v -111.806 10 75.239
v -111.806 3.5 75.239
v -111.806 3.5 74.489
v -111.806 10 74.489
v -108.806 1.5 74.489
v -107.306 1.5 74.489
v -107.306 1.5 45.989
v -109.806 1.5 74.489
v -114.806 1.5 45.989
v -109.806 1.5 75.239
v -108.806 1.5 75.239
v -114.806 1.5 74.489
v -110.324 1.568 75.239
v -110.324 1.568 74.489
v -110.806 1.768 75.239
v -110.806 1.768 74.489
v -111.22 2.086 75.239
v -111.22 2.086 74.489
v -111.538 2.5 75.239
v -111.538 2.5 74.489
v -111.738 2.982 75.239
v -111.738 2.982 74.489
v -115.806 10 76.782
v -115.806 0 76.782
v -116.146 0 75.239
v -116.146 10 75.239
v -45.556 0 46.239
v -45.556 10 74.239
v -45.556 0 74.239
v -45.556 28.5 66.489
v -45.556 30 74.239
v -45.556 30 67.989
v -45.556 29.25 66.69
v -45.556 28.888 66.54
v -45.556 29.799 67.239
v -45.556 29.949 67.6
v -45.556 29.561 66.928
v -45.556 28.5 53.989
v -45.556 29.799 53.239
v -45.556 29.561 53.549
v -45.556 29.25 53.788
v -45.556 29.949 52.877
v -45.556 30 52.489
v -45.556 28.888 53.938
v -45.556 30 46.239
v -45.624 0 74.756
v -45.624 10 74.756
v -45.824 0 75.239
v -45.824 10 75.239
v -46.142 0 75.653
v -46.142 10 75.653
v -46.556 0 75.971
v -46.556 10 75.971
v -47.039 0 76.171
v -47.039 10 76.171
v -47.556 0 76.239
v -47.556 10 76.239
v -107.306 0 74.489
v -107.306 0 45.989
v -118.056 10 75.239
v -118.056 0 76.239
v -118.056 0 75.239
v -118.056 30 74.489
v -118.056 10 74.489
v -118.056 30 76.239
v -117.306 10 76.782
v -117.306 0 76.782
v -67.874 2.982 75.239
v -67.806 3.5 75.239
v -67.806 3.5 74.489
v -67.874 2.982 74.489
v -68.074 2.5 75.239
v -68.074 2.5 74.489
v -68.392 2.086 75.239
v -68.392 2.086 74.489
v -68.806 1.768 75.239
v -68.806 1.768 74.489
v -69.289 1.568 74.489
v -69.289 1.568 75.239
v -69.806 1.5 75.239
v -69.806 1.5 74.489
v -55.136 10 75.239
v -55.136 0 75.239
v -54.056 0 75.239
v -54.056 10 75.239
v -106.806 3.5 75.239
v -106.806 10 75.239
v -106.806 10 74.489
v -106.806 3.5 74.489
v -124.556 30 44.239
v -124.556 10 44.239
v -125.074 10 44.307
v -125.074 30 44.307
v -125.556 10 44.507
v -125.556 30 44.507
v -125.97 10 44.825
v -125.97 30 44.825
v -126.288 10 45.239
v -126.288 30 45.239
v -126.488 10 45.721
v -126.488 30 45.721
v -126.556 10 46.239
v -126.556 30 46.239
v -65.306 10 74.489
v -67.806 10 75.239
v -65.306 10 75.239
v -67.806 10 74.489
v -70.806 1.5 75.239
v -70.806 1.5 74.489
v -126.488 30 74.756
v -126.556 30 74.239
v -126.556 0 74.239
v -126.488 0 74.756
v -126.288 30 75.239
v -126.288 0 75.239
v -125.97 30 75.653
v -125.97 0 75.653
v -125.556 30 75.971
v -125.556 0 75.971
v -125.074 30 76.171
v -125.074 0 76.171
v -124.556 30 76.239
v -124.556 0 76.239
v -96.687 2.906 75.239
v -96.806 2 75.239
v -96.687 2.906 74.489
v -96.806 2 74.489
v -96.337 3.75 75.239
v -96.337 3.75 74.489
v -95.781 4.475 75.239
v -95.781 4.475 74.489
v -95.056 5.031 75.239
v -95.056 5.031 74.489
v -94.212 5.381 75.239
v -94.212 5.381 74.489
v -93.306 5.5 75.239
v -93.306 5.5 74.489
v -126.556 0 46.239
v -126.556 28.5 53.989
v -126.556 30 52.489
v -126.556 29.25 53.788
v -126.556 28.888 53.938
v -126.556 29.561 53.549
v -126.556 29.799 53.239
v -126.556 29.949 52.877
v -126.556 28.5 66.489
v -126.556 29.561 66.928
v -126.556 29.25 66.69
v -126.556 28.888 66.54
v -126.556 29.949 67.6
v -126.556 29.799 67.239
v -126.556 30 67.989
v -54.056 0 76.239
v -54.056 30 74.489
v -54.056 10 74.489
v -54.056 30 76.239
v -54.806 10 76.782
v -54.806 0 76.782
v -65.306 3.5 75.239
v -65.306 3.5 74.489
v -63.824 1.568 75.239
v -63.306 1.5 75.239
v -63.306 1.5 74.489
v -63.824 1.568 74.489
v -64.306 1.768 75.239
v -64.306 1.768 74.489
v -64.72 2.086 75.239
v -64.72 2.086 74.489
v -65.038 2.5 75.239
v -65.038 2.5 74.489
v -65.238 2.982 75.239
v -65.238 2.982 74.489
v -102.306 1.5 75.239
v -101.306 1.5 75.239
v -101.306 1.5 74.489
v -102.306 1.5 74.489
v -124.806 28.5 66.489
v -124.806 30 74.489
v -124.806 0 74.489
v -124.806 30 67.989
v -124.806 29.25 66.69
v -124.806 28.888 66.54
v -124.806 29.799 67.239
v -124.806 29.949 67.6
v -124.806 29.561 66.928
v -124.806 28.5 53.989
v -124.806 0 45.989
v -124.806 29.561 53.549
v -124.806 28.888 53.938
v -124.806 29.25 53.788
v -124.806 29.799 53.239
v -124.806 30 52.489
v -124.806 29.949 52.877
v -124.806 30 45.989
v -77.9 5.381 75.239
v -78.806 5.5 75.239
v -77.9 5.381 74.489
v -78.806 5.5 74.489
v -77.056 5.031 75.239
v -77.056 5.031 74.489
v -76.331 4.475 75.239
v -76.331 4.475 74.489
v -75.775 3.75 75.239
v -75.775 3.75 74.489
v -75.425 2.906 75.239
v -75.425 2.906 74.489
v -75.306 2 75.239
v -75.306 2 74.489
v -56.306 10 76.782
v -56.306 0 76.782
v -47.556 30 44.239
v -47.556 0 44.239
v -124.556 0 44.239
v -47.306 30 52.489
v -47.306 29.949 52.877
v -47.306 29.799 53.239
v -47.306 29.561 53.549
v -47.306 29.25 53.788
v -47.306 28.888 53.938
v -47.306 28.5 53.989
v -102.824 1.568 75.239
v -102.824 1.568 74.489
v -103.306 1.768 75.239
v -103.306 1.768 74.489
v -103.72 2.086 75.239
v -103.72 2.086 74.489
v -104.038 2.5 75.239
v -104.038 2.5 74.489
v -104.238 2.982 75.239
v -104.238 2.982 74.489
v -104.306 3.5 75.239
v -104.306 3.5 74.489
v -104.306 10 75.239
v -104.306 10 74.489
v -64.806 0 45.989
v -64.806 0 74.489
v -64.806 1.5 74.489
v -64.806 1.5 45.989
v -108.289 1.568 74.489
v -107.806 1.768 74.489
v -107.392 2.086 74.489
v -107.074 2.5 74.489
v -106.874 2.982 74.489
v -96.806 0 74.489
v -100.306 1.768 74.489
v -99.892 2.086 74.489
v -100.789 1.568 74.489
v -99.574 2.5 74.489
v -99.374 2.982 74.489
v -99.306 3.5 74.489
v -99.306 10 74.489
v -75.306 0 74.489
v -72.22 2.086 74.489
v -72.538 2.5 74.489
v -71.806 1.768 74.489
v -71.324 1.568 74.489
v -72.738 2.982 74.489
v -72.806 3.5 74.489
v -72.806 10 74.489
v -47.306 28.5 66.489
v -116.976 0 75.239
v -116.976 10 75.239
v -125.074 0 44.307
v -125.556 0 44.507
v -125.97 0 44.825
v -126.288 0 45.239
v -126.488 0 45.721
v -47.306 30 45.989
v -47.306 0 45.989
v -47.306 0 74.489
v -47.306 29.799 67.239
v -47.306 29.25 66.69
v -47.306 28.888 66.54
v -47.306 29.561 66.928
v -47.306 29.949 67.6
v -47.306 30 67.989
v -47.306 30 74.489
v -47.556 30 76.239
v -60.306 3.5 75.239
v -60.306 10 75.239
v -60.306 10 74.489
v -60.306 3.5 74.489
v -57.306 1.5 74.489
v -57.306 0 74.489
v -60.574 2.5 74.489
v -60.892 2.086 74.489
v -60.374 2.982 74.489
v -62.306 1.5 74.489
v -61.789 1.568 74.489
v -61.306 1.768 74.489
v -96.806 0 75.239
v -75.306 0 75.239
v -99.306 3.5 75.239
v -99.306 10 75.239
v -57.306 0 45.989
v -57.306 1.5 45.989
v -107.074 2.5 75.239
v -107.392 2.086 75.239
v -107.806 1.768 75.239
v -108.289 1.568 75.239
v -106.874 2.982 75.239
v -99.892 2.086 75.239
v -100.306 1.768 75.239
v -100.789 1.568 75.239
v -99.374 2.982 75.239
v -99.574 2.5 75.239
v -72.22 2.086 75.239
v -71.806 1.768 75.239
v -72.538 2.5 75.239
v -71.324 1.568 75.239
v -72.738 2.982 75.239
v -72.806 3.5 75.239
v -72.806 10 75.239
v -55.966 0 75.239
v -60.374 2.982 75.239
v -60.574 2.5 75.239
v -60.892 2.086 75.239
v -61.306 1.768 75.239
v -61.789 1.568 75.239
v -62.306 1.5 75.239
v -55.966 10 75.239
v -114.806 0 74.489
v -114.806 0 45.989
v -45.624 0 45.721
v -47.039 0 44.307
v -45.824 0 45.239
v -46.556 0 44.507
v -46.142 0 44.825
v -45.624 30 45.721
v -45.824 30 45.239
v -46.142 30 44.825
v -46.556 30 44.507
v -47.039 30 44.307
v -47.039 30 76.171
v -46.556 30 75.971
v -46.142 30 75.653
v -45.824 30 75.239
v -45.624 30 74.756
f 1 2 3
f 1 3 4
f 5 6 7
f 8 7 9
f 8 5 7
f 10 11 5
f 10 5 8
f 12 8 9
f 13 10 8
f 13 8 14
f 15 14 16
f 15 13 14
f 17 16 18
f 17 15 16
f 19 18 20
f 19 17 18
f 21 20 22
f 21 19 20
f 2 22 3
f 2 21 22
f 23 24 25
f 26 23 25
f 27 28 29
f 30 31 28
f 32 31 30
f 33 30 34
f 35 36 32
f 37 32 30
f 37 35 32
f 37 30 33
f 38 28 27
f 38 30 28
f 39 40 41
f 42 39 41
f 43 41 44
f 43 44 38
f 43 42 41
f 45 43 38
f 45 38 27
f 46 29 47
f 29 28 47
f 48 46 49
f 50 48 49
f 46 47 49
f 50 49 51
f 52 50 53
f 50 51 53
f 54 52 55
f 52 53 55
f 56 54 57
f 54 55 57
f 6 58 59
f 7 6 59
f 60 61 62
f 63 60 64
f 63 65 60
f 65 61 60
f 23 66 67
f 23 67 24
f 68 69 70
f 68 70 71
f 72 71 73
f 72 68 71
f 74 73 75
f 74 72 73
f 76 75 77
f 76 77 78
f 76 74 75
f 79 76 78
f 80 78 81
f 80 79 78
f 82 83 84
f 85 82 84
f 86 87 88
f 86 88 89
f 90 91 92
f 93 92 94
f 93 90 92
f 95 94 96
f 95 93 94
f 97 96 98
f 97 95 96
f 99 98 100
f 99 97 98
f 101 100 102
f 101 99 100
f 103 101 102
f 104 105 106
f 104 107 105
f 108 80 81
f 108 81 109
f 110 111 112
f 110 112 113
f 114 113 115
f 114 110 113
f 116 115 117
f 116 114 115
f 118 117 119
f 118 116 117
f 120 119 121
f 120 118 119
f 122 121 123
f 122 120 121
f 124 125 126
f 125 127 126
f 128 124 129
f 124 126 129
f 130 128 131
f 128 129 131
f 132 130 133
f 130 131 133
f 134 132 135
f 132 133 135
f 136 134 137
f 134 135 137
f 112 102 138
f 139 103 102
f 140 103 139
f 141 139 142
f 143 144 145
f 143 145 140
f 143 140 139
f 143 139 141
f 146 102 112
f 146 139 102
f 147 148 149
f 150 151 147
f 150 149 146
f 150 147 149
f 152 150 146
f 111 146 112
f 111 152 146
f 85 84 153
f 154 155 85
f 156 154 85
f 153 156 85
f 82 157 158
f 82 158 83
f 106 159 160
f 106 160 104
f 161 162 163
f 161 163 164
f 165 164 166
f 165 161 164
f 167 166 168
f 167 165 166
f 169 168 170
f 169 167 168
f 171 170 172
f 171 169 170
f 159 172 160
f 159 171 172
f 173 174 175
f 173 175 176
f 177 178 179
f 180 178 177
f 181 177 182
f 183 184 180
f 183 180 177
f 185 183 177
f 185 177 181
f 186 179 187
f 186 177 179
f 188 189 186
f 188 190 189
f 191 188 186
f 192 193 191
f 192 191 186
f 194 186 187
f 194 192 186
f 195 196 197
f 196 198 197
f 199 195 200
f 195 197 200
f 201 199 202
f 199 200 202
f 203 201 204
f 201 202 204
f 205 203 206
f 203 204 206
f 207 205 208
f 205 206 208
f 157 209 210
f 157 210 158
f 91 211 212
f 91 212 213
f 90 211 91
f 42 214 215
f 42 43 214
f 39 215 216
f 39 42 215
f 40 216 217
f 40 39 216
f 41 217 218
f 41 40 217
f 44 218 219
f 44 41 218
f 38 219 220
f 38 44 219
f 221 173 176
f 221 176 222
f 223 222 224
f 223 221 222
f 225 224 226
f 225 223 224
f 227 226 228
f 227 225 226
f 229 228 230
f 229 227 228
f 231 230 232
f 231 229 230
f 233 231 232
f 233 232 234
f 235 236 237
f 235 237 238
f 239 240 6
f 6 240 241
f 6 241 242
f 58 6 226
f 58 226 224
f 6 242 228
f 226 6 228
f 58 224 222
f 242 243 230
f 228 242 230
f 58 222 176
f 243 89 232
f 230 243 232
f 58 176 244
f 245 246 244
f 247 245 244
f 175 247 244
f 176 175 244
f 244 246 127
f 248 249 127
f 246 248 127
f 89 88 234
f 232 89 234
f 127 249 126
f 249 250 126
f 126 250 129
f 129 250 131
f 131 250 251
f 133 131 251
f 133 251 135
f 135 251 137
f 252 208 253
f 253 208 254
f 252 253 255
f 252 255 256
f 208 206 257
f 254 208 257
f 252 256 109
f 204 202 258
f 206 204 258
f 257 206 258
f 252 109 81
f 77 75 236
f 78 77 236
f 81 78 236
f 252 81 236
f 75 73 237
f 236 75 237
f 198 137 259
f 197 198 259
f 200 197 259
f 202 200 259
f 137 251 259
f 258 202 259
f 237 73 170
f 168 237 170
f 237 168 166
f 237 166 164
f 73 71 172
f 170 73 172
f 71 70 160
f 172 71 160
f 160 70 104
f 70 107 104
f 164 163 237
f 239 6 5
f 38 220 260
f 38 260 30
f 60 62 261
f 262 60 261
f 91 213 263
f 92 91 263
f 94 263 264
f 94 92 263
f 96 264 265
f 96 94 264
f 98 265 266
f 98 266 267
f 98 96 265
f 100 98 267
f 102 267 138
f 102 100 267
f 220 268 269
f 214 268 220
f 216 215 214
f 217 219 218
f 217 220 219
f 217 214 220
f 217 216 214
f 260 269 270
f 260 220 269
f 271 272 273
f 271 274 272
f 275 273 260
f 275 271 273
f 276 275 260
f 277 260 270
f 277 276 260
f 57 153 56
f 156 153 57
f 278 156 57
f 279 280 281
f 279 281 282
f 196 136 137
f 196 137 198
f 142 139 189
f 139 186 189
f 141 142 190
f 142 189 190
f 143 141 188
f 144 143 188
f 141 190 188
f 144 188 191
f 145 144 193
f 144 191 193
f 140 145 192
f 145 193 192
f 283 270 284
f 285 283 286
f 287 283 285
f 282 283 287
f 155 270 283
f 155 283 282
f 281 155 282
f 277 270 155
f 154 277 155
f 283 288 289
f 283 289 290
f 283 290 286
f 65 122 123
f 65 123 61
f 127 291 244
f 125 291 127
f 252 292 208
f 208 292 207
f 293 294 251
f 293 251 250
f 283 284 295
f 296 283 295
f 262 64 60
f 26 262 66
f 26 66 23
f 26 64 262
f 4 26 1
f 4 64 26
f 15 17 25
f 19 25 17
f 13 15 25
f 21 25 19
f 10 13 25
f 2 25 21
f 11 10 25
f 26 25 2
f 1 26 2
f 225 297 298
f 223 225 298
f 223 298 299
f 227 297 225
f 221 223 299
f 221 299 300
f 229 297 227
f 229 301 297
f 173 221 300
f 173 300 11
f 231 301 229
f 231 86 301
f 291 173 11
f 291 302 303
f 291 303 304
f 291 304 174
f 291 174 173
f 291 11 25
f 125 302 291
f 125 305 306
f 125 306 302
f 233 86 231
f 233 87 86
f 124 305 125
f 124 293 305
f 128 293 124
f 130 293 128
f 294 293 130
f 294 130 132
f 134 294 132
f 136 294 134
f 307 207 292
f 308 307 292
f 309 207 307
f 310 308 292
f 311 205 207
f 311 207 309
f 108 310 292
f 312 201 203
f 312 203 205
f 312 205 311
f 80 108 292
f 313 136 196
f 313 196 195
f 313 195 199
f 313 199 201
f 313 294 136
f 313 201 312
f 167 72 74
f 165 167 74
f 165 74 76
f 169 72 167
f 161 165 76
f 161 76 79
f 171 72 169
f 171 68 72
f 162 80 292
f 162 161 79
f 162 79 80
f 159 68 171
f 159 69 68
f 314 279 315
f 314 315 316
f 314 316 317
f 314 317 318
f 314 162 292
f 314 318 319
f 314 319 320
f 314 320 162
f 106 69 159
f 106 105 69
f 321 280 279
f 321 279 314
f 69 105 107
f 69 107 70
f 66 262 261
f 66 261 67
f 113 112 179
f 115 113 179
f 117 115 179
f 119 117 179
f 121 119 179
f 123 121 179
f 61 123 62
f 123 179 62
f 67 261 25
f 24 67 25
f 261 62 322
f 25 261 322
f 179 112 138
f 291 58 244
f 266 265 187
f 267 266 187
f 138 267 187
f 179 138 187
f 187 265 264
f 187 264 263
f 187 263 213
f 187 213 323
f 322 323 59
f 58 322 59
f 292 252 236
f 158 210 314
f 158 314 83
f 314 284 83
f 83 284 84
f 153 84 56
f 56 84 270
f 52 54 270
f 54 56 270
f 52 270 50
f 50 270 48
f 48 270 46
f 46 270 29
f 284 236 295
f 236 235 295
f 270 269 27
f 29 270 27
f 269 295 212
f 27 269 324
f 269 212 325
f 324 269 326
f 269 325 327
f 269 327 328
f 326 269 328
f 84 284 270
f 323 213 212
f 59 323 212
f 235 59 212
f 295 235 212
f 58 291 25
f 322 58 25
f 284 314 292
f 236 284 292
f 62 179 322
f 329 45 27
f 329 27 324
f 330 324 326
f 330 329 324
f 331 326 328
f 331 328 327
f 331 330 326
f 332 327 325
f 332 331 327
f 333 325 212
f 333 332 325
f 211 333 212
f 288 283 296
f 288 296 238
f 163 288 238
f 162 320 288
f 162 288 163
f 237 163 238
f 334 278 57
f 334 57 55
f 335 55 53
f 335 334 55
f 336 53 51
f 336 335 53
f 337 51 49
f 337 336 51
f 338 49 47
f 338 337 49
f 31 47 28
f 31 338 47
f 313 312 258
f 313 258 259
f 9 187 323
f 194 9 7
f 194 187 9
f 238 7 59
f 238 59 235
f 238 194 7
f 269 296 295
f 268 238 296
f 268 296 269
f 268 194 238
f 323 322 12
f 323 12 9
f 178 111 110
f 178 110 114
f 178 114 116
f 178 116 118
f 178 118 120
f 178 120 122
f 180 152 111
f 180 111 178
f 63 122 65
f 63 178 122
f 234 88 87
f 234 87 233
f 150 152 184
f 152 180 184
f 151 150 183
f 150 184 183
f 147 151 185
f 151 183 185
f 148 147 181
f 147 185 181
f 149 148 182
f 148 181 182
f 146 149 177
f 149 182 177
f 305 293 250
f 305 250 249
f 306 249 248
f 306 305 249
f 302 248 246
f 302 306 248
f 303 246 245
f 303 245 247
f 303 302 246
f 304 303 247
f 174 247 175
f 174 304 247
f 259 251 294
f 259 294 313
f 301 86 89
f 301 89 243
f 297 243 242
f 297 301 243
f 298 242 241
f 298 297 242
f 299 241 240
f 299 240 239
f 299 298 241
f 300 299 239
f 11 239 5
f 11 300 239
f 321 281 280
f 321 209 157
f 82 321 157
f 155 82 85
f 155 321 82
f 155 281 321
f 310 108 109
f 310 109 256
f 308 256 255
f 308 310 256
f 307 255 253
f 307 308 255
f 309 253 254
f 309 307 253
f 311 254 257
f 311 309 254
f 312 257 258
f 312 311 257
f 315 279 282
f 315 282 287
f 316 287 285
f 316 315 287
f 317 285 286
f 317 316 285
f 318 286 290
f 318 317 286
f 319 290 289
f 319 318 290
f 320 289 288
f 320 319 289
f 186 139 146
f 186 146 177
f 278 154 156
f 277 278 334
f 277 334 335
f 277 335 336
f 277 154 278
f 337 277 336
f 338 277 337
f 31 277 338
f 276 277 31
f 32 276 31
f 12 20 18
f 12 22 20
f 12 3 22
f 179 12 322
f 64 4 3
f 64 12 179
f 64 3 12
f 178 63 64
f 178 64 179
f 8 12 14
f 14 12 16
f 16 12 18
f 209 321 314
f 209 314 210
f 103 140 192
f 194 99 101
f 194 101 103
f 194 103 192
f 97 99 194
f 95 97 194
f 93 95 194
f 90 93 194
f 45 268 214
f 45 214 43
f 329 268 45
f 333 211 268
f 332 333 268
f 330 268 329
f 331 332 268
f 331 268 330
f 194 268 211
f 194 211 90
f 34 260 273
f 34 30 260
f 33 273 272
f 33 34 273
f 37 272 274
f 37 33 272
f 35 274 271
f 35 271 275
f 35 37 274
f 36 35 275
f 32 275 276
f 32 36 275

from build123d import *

# Parameters (mm, degrees)
SKETCH1_W           = 81
SKETCH1_H           = 32
BOSS_EXTRUDE1_DEPTH = 10
SKETCH2_W           = 77.5
SKETCH2_H           = 28.5
CUT_EXTRUDE1_DEPTH  = 10
SKETCH3_W           = 7.5
SKETCH3_H           = 32
BOSS_EXTRUDE2_DEPTH = 1.5
SKETCH4_W           = 64
SKETCH4_H           = 1
CUT_EXTRUDE2_DEPTH  = 10
BOSS_EXTRUDE3_DEPTH = 10
BOSS_EXTRUDE4_DEPTH = 10
FILLET1_R           = 2
FILLET2_R           = 2
FILLET3_R           = 2
FILLET4_R           = 2
CUT_EXTRUDE3_DEPTH  = 0.75
SKETCH8_W           = 21.5
SKETCH8_H           = 5.5
CUT_EXTRUDE4_DEPTH  = 0.75
FILLET5_R           = 3.5
FILLET6_R           = 3.5
BOSS_EXTRUDE5_START = 20
BOSS_EXTRUDE5_DEPTH = 20
SKETCH10_W          = 1.75
SKETCH10_H          = 12.5
CUT_EXTRUDE5_DEPTH  = 1.5
FILLET7_R           = 1.5
FILLET8_R           = 1.5
FILLET10_R          = 1.5
FILLET11_R          = 1.5


with BuildPart() as part:
    # Sketch1 → Boss-Extrude1 (new body)
    with BuildSketch(Plane(origin=(0, 0, 0), x_dir=(1, 0, 0), z_dir=(0, 1, 0))):
        with Locations((-86.056207425, -60.23876691)):
            Rectangle(SKETCH1_W, SKETCH1_H)
    extrude(amount=BOSS_EXTRUDE1_DEPTH)

    # Sketch2 → Cut-Extrude1 (cut)
    with BuildSketch(Plane(origin=(0, 10, 0), x_dir=(1, 0, 0), z_dir=(0, 1, 0))):
        with Locations((-86.056207425, -60.23876691)):
            Rectangle(SKETCH2_W, SKETCH2_H)
    extrude(amount=-CUT_EXTRUDE1_DEPTH, mode=Mode.SUBTRACT)

    # Sketch3 → Boss-Extrude2 (add)
    with BuildSketch(Plane(origin=(0, 0, 0), x_dir=(-1, 0, 0), z_dir=(0, -1, 0))):
        with Locations((61.056207425, -60.23876691)):
            Rectangle(SKETCH3_W, SKETCH3_H)
        with Locations((111.056207425, -60.23876691)):
            Rectangle(SKETCH3_W, SKETCH3_H)
    extrude(amount=-BOSS_EXTRUDE2_DEPTH)

    # Sketch4 → Cut-Extrude2 (cut)
    with BuildSketch(Plane(origin=(0, 10, 0), x_dir=(1, 0, 0), z_dir=(0, 1, 0))):
        with Locations((-86.056207425, -75.73876691)):
            Rectangle(SKETCH4_W, SKETCH4_H)
    extrude(amount=-CUT_EXTRUDE2_DEPTH, mode=Mode.SUBTRACT)

    # Sketch5 → Boss-Extrude3 (add)
    with BuildSketch(Plane(origin=(0, 10, 0), x_dir=(1, 0, 0), z_dir=(0, 1, 0))):
        Polygon((-116.976207425, -75.23876691), (-117.306207425, -76.781751031), (-115.806207425, -76.781751031), (-116.146207425, -75.23876691), align=None)
    extrude(amount=-BOSS_EXTRUDE3_DEPTH)

    # Sketch6 → Boss-Extrude4 (add)
    with BuildSketch(Plane(origin=(0, 10, 0), x_dir=(1, 0, 0), z_dir=(0, 1, 0))):
        Polygon((-55.966207425, -75.23876691), (-56.306207425, -76.781751031), (-54.806207425, -76.781751031), (-55.136207425, -75.23876691), align=None)
    extrude(amount=-BOSS_EXTRUDE4_DEPTH)

    # Fillet1
    fillet1_edges = [part.edges().sort_by_distance(p)[0] for p in [
        (-126.556207425, 5, 76.23876691),
    ]]
    fillet(fillet1_edges, radius=FILLET1_R)

    # Fillet2
    fillet2_edges = [part.edges().sort_by_distance(p)[0] for p in [
        (-45.556207425, 5, 76.23876691),
    ]]
    fillet(fillet2_edges, radius=FILLET2_R)

    # Fillet3
    fillet3_edges = [part.edges().sort_by_distance(p)[0] for p in [
        (-45.556207425, 5, 44.23876691),
    ]]
    fillet(fillet3_edges, radius=FILLET3_R)

    # Fillet4
    fillet4_edges = [part.edges().sort_by_distance(p)[0] for p in [
        (-126.556207425, 5, 44.23876691),
    ]]
    fillet(fillet4_edges, radius=FILLET4_R)

    # Sketch7 → Cut-Extrude3 (cut)
    with BuildSketch(Plane.XY.offset(75.23876691)):
        with BuildLine():
            Line((-111.806207425, 10), (-106.806207425, 10))
            Line((-106.806207425, 10), (-106.806207425, 3.5))
            ThreePointArc((-106.806207425, 3.5), (-107.391993862, 2.085786438), (-108.806207425, 1.5))
            Line((-108.806207425, 1.5), (-109.806207425, 1.5))
            ThreePointArc((-109.806207425, 1.5), (-111.220420987, 2.085786438), (-111.806207425, 3.5))
            Line((-111.806207425, 3.5), (-111.806207425, 10))
        make_face()
        with BuildLine():
            Line((-65.306207425, 10), (-60.306207425, 10))
            Line((-60.306207425, 10), (-60.306207425, 3.5))
            ThreePointArc((-60.306207425, 3.5), (-60.891993862, 2.085786438), (-62.306207425, 1.5))
            Line((-62.306207425, 1.5), (-63.306207425, 1.5))
            ThreePointArc((-63.306207425, 1.5), (-64.720420987, 2.085786438), (-65.306207425, 3.5))
            Line((-65.306207425, 3.5), (-65.306207425, 10))
        make_face()
        with BuildLine():
            Line((-104.306207425, 10), (-99.306207425, 10))
            Line((-99.306207425, 10), (-99.306207425, 3.5))
            ThreePointArc((-99.306207425, 3.5), (-99.891993862, 2.085786438), (-101.306207425, 1.5))
            Line((-101.306207425, 1.5), (-102.306207425, 1.5))
            ThreePointArc((-102.306207425, 1.5), (-103.720420987, 2.085786438), (-104.306207425, 3.5))
            Line((-104.306207425, 3.5), (-104.306207425, 10))
        make_face()
        with BuildLine():
            Line((-72.806207425, 10), (-67.806207425, 10))
            Line((-67.806207425, 10), (-67.806207425, 3.5))
            ThreePointArc((-67.806207425, 3.5), (-68.391993862, 2.085786438), (-69.806207425, 1.5))
            Line((-69.806207425, 1.5), (-70.806207425, 1.5))
            ThreePointArc((-70.806207425, 1.5), (-72.220420987, 2.085786438), (-72.806207425, 3.5))
            Line((-72.806207425, 3.5), (-72.806207425, 10))
        make_face()
    extrude(amount=-CUT_EXTRUDE3_DEPTH, mode=Mode.SUBTRACT)

    # Sketch8 → Cut-Extrude4 (cut)
    with BuildSketch(Plane.XY.offset(75.23876691)):
        with Locations((-86.056207425, 2.75)):
            Rectangle(SKETCH8_W, SKETCH8_H)
    extrude(amount=-CUT_EXTRUDE4_DEPTH, mode=Mode.SUBTRACT)

    # Fillet5
    fillet5_edges = [part.edges().sort_by_distance(p)[0] for p in [
        (-96.806207425, 5.5, 74.86376691),
    ]]
    fillet(fillet5_edges, radius=FILLET5_R)

    # Fillet6
    fillet6_edges = [part.edges().sort_by_distance(p)[0] for p in [
        (-75.306207425, 5.5, 74.86376691),
    ]]
    fillet(fillet6_edges, radius=FILLET6_R)

    # Sketch9 → Boss-Extrude5 (add)
    with BuildSketch(Plane(origin=(0, 10, 0), x_dir=(1, 0, 0), z_dir=(0, 1, 0)).offset(BOSS_EXTRUDE5_START)):
        with BuildLine():
            Line((-47.556207425, -44.23876691), (-124.556207425, -44.23876691))
            ThreePointArc((-124.556207425, -44.23876691), (-125.970420987, -44.824553347), (-126.556207425, -46.23876691))
            Line((-126.556207425, -46.23876691), (-126.556207425, -74.23876691))
            ThreePointArc((-126.556207425, -74.23876691), (-125.970420987, -75.652980472), (-124.556207425, -76.23876691))
            Line((-124.556207425, -76.23876691), (-118.056207425, -76.23876691))
            Line((-118.056207425, -76.23876691), (-118.056207425, -75.23876691))
            Line((-118.056207425, -75.23876691), (-118.056207425, -74.48876691))
            Line((-118.056207425, -74.48876691), (-124.806207425, -74.48876691))
            Line((-124.806207425, -74.48876691), (-124.806207425, -45.98876691))
            Line((-124.806207425, -45.98876691), (-47.306207425, -45.98876691))
            Line((-47.306207425, -45.98876691), (-47.306207425, -74.48876691))
            Line((-47.306207425, -74.48876691), (-54.056207425, -74.48876691))
            Line((-54.056207425, -74.48876691), (-54.056207425, -75.23876691))
            Line((-54.056207425, -75.23876691), (-54.056207425, -76.23876691))
            Line((-54.056207425, -76.23876691), (-47.556207425, -76.23876691))
            ThreePointArc((-47.556207425, -76.23876691), (-46.141993862, -75.652980472), (-45.556207425, -74.23876691))
            Line((-45.556207425, -74.23876691), (-45.556207425, -46.23876691))
            ThreePointArc((-45.556207425, -46.23876691), (-46.141993862, -44.824553347), (-47.556207425, -44.23876691))
        make_face()
    extrude(amount=-BOSS_EXTRUDE5_DEPTH)

    # Sketch10 → Cut-Extrude5 (cut)
    with BuildSketch(Plane(origin=(0, 30, 0), x_dir=(1, 0, 0), z_dir=(0, 1, 0))):
        with Locations((-46.431207425, -60.23876691)):
            Rectangle(SKETCH10_W, SKETCH10_H)
        with Locations((-125.681207425, -60.23876691)):
            Rectangle(SKETCH10_W, SKETCH10_H)
    extrude(amount=-CUT_EXTRUDE5_DEPTH, mode=Mode.SUBTRACT)

    # Fillet7
    fillet7_edges = [part.edges().sort_by_distance(p)[0] for p in [
        (-125.681207425, 30, 66.48876691),
    ]]
    fillet(fillet7_edges, radius=FILLET7_R - 0.0001)  # a hair under: the kernel refuses the full size

    # Fillet8
    fillet8_edges = [part.edges().sort_by_distance(p)[0] for p in [
        (-125.681207425, 30, 53.98876691),
    ]]
    fillet(fillet8_edges, radius=FILLET8_R - 0.0001)  # a hair under: the kernel refuses the full size

    # Fillet10
    fillet10_edges = [part.edges().sort_by_distance(p)[0] for p in [
        (-46.431207425, 30, 53.98876691),
    ]]
    fillet(fillet10_edges, radius=FILLET10_R - 0.0001)  # a hair under: the kernel refuses the full size

    # Fillet11
    fillet11_edges = [part.edges().sort_by_distance(p)[0] for p in [
        (-46.431207425, 30, 66.48876691),
    ]]
    fillet(fillet11_edges, radius=FILLET11_R - 0.0001)  # a hair under: the kernel refuses the full size


solid = part.part
